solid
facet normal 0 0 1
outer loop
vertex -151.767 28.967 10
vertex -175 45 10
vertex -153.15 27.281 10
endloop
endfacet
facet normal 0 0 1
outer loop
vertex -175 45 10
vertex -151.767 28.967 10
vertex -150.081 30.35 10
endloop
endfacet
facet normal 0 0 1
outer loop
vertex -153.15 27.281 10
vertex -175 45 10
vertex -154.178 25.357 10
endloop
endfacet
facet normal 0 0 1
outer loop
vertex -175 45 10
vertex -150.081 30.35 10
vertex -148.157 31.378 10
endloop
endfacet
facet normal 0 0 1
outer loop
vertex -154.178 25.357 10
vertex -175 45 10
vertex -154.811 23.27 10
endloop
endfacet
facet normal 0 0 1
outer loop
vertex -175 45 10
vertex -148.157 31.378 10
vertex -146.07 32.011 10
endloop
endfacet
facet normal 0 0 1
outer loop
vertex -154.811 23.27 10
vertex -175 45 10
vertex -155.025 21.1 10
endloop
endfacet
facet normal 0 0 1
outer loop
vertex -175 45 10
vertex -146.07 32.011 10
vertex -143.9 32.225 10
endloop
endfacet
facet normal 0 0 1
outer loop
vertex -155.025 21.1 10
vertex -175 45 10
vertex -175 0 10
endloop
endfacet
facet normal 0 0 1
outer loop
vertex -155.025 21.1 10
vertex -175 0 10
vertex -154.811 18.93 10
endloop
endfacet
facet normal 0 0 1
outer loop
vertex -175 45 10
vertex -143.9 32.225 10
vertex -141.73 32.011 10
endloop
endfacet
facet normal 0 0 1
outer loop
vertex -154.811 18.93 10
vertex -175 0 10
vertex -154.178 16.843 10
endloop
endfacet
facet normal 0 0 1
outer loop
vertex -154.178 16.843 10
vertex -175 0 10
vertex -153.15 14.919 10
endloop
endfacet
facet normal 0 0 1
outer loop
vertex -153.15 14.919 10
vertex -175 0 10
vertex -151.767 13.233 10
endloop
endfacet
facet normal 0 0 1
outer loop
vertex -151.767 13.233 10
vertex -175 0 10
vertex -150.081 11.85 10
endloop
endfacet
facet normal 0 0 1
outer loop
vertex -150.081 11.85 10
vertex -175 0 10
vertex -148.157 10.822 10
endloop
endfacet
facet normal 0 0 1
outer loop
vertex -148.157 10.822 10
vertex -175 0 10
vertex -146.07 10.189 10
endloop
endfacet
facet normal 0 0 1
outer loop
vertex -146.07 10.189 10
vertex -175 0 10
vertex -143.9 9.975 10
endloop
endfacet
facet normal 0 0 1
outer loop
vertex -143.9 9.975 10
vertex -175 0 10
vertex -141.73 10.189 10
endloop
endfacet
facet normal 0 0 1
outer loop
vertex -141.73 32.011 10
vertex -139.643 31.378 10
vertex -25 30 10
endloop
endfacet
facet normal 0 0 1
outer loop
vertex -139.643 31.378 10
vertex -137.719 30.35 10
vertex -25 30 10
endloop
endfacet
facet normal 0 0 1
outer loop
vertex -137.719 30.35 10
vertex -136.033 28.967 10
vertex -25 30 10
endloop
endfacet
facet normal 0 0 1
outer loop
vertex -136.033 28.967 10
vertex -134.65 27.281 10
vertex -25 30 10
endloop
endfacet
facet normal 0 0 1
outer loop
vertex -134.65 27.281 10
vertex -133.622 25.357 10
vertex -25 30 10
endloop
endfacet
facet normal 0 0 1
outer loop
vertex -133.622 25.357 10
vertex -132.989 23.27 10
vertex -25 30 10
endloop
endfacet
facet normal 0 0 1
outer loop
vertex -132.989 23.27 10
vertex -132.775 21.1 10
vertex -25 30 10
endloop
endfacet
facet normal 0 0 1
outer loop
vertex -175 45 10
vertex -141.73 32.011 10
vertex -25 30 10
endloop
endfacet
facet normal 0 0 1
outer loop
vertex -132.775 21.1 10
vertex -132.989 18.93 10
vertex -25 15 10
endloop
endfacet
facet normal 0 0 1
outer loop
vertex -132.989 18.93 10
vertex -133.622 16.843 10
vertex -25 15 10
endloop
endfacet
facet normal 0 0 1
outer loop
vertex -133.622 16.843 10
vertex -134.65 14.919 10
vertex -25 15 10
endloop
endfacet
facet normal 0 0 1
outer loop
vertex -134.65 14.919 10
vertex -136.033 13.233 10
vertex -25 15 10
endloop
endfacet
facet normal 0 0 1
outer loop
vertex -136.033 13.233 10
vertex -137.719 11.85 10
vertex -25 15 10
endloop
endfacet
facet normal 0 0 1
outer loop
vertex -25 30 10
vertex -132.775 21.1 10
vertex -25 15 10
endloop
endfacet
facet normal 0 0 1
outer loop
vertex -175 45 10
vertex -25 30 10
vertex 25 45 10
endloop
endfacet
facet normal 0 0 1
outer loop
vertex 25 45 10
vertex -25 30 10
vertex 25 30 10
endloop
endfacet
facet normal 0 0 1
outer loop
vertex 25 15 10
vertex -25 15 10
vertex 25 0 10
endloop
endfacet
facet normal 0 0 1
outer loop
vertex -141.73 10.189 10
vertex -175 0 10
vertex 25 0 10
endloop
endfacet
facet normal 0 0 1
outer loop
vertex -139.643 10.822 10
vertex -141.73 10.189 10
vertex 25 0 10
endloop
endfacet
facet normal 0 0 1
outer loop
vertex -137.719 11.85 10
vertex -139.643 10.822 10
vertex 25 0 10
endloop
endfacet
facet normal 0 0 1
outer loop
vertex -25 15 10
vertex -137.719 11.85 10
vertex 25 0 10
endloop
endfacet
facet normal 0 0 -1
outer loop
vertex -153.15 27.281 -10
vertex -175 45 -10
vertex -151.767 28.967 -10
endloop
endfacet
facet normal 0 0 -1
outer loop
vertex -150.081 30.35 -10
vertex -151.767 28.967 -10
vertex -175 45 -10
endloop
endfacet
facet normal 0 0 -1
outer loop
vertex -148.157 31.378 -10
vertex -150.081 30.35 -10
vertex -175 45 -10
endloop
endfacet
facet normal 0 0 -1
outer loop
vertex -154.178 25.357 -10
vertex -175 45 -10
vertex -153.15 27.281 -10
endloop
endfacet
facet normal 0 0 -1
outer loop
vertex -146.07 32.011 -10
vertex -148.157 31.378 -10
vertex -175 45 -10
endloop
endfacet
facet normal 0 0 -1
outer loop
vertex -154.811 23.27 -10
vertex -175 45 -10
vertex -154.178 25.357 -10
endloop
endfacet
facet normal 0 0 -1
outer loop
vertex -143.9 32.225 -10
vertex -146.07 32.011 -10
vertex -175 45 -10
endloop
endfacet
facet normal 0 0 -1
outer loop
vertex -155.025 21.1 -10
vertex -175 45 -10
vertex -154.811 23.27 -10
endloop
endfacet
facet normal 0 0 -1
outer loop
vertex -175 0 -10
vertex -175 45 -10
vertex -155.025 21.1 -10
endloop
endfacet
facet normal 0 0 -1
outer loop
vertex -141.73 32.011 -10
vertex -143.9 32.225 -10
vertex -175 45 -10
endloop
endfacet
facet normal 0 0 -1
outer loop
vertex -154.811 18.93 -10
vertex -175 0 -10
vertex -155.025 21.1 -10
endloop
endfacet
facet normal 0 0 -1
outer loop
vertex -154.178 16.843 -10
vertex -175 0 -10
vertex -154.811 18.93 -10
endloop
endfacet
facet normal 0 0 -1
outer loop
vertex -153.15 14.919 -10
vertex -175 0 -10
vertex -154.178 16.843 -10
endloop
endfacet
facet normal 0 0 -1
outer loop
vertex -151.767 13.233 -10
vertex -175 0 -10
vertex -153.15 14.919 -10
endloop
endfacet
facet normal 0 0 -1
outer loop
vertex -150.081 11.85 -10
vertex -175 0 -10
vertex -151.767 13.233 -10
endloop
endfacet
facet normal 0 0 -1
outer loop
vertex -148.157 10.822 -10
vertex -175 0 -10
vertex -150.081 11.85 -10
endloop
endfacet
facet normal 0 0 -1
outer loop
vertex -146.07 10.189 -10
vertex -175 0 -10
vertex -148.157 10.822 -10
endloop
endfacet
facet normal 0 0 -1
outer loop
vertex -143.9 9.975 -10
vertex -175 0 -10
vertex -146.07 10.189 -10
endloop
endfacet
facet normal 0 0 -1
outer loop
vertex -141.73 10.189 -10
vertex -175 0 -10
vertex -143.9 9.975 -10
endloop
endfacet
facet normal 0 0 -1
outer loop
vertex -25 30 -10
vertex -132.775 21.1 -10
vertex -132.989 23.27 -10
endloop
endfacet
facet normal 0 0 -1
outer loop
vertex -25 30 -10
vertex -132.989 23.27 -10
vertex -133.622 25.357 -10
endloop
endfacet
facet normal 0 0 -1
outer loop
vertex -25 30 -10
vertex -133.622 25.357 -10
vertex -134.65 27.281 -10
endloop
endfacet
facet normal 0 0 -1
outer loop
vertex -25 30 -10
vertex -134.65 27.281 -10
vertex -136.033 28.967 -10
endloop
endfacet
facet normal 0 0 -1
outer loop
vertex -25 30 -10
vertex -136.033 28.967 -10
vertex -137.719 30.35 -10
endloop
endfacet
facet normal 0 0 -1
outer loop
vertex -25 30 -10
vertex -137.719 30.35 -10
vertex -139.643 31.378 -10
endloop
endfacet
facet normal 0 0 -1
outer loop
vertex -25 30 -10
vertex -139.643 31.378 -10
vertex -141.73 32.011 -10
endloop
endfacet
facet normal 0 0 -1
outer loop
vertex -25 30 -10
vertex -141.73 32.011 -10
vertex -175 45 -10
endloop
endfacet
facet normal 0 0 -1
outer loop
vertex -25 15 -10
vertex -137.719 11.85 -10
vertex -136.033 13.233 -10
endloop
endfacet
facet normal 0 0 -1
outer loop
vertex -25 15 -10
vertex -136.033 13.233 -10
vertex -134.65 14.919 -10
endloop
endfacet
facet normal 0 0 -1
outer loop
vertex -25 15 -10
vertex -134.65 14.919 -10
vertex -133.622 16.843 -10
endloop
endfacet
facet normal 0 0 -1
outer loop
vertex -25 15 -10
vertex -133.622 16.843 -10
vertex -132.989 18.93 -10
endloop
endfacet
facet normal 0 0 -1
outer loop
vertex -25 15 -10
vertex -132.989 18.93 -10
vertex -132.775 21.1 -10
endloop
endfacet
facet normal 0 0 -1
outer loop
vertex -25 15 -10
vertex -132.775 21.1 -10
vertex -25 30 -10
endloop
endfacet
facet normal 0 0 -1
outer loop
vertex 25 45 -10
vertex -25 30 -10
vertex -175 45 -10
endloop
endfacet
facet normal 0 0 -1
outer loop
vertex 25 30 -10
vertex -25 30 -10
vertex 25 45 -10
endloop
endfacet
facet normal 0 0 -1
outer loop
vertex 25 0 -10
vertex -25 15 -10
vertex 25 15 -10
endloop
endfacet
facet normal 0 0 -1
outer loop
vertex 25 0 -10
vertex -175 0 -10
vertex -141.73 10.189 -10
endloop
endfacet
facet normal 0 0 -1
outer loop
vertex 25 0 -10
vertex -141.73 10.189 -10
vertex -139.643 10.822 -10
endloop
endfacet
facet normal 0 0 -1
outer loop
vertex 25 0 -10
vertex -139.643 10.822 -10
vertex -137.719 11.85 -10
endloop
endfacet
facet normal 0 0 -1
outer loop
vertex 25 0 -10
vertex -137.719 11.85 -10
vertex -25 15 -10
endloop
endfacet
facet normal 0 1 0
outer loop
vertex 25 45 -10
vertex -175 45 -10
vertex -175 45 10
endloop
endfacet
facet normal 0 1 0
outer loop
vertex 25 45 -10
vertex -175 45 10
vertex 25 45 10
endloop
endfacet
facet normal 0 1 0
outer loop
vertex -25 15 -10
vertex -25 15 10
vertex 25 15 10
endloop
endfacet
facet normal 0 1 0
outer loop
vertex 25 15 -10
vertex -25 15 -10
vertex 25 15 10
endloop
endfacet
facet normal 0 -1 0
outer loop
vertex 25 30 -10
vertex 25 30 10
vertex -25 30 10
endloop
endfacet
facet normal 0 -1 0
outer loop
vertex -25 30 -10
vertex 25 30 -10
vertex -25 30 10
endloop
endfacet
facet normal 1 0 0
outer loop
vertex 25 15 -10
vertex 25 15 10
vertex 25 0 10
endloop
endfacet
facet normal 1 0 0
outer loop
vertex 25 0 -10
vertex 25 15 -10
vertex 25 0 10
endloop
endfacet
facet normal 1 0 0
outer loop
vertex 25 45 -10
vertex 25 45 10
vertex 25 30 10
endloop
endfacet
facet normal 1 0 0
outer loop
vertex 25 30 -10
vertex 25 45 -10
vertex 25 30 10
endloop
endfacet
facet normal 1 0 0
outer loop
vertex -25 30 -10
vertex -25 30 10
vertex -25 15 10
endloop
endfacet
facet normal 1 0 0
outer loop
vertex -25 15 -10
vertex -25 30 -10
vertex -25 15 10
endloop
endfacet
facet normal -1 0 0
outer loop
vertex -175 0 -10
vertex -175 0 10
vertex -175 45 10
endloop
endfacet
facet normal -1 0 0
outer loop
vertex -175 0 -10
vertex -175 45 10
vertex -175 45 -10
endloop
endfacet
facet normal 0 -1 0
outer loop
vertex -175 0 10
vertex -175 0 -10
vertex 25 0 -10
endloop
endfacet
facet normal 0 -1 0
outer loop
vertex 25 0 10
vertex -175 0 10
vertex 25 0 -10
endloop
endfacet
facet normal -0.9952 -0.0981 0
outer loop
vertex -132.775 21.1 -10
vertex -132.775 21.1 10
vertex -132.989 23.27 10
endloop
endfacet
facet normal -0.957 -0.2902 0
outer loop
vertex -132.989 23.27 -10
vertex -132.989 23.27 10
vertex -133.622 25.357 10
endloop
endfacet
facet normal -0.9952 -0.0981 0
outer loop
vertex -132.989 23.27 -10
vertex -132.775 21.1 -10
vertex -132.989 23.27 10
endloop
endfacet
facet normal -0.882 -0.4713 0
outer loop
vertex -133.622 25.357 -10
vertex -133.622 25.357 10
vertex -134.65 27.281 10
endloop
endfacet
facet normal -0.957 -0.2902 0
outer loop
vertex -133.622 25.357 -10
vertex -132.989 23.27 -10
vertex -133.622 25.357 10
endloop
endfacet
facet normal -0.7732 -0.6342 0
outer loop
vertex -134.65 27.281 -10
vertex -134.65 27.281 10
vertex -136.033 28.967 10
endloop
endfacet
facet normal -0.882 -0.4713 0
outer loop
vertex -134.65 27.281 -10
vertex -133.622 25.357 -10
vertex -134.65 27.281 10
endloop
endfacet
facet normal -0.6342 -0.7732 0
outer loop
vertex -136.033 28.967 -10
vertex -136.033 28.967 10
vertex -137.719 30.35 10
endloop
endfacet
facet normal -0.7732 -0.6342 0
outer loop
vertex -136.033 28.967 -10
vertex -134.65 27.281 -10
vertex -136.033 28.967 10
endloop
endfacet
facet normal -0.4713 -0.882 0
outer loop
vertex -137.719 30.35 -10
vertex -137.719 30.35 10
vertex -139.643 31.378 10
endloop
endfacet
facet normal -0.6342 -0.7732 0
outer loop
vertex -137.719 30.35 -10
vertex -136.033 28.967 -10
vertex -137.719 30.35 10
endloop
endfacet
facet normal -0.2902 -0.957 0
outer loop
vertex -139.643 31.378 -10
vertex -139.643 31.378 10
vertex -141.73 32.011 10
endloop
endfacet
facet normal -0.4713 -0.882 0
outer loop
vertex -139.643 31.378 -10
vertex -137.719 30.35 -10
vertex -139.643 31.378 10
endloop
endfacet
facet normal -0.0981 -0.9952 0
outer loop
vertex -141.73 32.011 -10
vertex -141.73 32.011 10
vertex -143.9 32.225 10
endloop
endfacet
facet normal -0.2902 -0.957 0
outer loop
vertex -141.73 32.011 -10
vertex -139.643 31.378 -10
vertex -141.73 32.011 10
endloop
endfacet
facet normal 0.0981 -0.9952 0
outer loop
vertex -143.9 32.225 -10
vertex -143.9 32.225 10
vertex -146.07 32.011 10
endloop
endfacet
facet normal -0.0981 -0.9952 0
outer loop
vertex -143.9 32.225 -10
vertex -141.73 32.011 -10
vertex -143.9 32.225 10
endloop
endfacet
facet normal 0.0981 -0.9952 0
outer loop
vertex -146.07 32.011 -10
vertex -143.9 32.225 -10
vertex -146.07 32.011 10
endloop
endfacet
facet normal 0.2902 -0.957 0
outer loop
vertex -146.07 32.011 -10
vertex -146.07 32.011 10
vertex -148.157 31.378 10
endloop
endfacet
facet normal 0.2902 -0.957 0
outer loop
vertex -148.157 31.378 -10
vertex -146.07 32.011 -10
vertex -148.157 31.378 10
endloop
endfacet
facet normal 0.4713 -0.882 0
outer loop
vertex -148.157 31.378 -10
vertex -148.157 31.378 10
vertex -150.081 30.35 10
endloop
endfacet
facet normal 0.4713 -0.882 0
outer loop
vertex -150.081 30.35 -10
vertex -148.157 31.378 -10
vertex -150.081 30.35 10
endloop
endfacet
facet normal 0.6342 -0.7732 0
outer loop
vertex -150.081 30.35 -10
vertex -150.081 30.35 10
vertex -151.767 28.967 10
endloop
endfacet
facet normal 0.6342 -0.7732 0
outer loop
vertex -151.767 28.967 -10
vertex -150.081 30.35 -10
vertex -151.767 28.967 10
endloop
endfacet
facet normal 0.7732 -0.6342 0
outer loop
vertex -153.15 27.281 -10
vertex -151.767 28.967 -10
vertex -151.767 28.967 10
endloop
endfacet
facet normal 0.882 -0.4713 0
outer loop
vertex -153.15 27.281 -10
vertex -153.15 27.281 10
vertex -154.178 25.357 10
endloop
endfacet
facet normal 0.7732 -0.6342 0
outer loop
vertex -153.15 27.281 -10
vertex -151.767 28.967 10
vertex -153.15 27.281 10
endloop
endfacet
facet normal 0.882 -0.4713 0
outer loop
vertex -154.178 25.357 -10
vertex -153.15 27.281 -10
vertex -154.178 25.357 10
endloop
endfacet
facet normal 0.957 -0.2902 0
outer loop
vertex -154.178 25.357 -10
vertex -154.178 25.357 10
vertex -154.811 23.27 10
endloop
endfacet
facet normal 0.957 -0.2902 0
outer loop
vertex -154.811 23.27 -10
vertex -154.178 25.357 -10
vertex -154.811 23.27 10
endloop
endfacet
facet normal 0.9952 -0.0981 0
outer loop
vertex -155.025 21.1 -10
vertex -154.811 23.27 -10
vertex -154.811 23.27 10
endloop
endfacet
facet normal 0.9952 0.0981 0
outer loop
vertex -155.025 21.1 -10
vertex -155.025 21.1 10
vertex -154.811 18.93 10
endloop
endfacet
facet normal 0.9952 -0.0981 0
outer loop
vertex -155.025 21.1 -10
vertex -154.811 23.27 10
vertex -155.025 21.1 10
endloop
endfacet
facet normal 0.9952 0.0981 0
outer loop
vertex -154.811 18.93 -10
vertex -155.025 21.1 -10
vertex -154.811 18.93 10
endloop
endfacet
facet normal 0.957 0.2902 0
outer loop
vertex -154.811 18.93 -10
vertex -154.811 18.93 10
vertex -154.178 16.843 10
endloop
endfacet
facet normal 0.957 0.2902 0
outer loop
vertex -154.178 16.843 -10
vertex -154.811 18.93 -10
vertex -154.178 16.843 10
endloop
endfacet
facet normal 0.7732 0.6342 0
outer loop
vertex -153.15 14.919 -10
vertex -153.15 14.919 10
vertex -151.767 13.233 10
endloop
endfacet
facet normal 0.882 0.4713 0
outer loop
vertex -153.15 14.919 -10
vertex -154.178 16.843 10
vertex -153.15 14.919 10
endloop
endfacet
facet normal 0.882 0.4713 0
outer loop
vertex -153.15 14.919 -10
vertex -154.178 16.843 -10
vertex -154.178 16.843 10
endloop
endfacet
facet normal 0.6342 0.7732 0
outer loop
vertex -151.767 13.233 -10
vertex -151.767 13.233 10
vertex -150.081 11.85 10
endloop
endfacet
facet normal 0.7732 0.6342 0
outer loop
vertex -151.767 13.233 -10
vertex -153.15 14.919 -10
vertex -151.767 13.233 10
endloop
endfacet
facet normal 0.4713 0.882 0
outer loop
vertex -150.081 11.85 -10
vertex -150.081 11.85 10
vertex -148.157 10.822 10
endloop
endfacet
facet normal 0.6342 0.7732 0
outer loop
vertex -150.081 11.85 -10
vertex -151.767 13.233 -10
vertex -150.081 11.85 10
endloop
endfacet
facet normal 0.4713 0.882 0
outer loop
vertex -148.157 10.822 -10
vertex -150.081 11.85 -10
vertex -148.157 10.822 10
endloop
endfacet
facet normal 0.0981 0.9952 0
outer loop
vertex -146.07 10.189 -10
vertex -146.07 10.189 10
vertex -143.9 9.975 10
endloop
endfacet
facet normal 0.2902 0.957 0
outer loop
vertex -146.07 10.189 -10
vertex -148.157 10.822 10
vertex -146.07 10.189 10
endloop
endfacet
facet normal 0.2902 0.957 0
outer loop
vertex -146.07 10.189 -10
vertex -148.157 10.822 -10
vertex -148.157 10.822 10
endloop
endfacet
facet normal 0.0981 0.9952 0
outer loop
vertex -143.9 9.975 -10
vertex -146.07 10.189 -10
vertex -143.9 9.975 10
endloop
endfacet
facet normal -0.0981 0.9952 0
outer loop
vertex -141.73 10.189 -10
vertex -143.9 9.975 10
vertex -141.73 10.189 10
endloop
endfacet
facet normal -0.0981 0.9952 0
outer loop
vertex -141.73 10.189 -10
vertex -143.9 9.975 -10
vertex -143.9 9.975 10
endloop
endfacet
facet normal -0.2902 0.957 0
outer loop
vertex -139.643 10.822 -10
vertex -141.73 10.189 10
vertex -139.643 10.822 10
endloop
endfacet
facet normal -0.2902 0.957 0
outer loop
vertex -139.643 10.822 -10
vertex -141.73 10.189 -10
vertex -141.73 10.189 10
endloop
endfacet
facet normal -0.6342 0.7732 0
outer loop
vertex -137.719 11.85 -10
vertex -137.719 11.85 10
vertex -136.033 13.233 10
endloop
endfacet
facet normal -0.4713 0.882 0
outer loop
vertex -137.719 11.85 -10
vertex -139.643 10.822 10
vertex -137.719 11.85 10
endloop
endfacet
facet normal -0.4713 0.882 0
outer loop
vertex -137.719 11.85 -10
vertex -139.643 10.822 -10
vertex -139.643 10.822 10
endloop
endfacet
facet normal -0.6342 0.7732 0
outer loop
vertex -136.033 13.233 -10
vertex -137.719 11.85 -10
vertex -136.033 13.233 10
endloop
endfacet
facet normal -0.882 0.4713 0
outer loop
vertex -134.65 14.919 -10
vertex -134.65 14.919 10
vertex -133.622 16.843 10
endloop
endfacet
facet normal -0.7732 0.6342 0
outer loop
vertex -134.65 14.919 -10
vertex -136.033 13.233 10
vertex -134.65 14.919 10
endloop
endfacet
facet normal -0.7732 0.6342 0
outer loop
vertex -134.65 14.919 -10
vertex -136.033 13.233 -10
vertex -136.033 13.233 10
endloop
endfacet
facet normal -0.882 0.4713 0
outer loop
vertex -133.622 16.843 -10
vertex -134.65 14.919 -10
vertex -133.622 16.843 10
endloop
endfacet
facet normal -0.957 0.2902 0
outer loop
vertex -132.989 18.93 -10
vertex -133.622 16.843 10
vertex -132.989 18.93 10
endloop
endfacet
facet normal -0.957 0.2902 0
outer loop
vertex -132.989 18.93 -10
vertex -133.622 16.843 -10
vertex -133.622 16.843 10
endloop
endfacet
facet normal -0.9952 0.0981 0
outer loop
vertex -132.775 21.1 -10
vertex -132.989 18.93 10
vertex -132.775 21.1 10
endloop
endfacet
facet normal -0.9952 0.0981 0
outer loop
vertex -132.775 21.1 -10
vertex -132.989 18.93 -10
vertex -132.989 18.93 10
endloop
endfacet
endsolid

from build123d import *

# Parameters (mm, degrees)
CROQUIS1_W              = 350
CROQUIS1_H              = 20
SALIENTE_EXTRUIR1_DEPTH = 45
CROQUIS2_R              = 11.125
CORTAR_EXTRUIR1_DEPTH   = 182.796589627
CROQUIS3_R              = 11.125
CORTAR_EXTRUIR2_DEPTH   = 182.796589627


with BuildPart() as part:
    # Croquis1 → Saliente-Extruir1 (new body)
    with BuildSketch(Plane(origin=(0, 0, 0), x_dir=(1, 0, 0), z_dir=(0, 1, 0))):
        Rectangle(CROQUIS1_W, CROQUIS1_H)
    extrude(amount=SALIENTE_EXTRUIR1_DEPTH)

    # Croquis2 → Cortar-Extruir1 (cut, through all)
    with BuildSketch(Plane(origin=(0, 0, -10), x_dir=(-1, 0, 0), z_dir=(0, 0, -1))):
        with Locations((-143.9, 21.1)):
            Circle(CROQUIS2_R)
    cortar_extruir1 = extrude(amount=-CORTAR_EXTRUIR1_DEPTH, mode=Mode.SUBTRACT)

    # Simetría1: Cortar-Extruir1 across plane
    add(cortar_extruir1.mirror(Plane(origin=(0, 0, 0), x_dir=(0, 0, 1), z_dir=(1, 0, 0))), mode=Mode.SUBTRACT)

    # Croquis3 → Cortar-Extruir2 (cut, through all)
    with BuildSketch(Plane.XY.offset(10)):
        Polygon((25, 15), (25, 0), (175, 0), (175, 45), (25, 45), (25, 30), (-25, 30), (-25, 15), align=None)
        with Locations((143.9, 21.1)):
            Circle(CROQUIS3_R, mode=Mode.SUBTRACT)
    extrude(amount=-CORTAR_EXTRUIR2_DEPTH, mode=Mode.SUBTRACT)


solid = part.part
